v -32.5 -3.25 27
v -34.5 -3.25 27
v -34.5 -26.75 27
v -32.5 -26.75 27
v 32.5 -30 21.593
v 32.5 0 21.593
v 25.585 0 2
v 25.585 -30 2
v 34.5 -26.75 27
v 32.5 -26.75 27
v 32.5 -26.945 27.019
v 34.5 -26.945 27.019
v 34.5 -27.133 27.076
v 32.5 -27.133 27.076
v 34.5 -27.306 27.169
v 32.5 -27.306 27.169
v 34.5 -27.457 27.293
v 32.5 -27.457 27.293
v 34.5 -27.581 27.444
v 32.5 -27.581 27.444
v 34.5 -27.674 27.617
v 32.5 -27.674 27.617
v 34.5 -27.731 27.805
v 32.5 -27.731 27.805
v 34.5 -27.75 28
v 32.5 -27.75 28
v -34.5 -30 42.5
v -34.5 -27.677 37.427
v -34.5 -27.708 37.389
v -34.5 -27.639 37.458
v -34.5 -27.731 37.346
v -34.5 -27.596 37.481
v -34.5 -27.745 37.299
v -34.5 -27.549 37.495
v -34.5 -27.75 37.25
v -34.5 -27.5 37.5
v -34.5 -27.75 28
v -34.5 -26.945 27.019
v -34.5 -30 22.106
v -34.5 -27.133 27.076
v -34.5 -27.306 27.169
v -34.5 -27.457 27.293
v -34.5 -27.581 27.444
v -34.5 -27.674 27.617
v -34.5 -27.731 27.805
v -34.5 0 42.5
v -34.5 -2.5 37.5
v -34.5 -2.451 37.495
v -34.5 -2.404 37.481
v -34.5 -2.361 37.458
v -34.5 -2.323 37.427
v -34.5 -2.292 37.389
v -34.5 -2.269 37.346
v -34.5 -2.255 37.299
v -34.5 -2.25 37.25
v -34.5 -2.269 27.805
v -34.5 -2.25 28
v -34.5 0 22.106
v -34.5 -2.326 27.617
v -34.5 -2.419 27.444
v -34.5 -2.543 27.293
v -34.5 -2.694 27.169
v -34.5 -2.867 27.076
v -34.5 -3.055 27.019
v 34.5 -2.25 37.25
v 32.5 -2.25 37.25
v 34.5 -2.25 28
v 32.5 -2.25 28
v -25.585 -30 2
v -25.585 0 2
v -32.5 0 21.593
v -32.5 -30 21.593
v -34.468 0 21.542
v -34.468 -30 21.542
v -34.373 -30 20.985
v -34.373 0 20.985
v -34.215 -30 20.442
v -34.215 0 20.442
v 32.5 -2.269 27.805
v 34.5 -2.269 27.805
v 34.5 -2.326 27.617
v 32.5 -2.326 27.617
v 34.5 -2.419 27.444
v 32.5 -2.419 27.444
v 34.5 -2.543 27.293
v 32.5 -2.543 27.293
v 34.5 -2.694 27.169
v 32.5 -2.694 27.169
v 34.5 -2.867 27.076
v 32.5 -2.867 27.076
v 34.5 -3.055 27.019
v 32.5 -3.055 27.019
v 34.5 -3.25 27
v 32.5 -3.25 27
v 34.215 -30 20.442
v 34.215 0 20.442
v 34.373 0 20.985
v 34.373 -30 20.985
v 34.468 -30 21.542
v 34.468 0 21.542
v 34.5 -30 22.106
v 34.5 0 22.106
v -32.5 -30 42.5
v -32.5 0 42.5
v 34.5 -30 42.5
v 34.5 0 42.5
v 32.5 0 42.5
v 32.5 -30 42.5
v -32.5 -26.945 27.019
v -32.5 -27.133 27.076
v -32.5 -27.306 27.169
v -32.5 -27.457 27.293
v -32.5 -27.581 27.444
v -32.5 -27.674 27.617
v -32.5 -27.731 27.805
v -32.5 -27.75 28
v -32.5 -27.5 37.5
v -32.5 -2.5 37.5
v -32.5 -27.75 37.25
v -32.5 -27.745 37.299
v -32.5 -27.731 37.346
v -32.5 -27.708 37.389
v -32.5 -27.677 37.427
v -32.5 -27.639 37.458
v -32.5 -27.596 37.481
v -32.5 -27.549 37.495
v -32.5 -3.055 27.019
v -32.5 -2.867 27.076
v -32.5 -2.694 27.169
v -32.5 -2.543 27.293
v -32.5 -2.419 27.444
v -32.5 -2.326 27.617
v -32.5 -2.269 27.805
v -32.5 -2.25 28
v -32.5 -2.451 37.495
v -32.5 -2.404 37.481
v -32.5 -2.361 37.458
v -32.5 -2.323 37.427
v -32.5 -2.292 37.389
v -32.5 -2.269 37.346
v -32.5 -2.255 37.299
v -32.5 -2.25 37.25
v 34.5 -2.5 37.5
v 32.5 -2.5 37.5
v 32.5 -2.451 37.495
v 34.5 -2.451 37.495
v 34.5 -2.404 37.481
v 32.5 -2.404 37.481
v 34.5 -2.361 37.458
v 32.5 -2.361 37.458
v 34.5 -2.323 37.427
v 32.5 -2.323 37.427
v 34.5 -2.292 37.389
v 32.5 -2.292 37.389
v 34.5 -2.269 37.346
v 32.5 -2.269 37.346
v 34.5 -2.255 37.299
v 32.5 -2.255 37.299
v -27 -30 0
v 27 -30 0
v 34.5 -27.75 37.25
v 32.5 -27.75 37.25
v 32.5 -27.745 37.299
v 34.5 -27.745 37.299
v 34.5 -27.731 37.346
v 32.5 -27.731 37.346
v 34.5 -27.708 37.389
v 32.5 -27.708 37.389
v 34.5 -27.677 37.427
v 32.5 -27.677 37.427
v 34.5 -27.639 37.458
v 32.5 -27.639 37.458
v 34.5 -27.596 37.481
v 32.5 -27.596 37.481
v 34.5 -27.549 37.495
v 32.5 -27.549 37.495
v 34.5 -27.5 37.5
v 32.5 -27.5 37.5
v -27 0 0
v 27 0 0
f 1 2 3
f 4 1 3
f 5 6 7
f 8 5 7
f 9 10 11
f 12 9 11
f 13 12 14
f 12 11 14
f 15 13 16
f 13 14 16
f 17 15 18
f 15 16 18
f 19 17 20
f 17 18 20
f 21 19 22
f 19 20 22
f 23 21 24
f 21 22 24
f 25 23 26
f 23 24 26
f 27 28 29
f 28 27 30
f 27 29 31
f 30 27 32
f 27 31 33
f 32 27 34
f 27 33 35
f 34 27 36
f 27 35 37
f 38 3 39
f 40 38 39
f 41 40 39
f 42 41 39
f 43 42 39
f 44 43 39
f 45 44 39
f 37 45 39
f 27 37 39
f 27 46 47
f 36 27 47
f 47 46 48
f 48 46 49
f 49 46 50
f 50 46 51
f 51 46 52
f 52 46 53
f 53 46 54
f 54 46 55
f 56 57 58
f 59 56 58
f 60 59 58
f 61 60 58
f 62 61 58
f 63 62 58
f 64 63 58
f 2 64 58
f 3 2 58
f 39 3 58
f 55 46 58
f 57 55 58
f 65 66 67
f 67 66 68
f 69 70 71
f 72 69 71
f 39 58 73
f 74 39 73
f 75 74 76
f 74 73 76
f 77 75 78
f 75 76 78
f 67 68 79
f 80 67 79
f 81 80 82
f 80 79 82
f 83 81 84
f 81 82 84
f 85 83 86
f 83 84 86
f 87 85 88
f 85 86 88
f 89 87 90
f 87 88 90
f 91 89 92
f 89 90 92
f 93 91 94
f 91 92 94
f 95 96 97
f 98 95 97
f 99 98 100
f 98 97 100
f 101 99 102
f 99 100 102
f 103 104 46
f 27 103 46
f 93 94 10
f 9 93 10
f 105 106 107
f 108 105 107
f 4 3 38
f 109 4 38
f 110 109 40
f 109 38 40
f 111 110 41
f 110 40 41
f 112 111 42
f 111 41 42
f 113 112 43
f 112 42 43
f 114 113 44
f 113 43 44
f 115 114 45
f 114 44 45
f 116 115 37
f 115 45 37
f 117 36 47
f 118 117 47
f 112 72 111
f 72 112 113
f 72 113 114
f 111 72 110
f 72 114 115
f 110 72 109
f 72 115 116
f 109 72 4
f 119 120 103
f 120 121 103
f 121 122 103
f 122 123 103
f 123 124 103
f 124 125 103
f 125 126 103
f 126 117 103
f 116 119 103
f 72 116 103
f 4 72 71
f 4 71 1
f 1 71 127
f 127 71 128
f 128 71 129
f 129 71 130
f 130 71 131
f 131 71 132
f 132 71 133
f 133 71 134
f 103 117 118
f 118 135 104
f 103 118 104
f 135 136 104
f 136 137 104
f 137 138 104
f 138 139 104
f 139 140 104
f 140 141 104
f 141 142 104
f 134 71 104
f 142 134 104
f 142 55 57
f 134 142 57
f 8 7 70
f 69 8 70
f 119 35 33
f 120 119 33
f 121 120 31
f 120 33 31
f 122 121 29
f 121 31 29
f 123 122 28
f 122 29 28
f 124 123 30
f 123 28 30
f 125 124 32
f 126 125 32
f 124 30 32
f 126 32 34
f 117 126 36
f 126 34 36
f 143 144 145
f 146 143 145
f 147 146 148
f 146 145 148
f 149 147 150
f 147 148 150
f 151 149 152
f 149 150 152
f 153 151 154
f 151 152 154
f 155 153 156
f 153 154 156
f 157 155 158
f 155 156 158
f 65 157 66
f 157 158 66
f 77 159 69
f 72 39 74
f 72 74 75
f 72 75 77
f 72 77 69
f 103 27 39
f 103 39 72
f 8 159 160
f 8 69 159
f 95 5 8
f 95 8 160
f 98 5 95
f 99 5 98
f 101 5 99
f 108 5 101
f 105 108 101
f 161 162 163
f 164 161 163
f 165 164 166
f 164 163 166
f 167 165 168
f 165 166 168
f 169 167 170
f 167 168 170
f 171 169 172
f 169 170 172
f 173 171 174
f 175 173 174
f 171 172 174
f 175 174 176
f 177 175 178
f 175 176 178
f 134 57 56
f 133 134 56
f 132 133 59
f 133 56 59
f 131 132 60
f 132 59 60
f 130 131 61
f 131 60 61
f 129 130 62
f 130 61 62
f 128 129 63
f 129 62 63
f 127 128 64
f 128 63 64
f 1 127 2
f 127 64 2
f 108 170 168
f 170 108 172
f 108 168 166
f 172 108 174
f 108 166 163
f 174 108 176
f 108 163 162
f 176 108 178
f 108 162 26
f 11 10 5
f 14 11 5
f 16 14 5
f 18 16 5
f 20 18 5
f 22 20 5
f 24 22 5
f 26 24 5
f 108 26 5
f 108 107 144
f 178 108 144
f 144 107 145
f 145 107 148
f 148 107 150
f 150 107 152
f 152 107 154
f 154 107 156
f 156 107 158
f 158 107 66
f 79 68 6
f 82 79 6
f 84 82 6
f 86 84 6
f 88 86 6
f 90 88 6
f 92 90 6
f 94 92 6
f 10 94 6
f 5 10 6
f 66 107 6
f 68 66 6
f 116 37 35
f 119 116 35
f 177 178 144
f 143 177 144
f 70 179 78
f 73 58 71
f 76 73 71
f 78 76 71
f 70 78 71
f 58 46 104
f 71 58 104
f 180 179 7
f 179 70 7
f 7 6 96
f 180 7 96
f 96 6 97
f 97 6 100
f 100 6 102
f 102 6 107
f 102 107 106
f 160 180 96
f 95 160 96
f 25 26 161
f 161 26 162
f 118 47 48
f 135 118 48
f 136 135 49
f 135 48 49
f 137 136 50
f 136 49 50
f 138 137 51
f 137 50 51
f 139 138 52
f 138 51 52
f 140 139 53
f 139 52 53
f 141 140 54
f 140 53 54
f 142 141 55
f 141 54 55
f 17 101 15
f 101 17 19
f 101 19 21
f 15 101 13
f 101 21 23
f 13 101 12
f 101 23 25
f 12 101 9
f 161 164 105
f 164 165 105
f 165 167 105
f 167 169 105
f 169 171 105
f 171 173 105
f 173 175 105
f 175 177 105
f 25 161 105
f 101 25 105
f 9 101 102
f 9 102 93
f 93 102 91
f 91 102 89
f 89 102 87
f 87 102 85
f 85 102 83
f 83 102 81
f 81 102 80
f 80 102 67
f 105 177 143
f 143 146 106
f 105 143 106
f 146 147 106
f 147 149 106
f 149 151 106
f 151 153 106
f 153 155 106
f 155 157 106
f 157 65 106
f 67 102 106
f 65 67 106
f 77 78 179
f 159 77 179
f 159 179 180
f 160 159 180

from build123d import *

# Parameters (mm, degrees)
F1_DEPTH = 30
F3_DEPTH = 70


with BuildPart() as f1:
    # F0 (on Front) → F1 (new body)
    with BuildSketch(Plane.XZ):
        with BuildLine():
            Line((-27, 0), (0, 0))
            Line((0, 0), (27, 0))
            Line((27, 0), (34.214952, 20.442363))
            ThreePointArc((34.214952, 20.442363), (34.428223, 21.262295), (34.5, 22.106464))
            Line((34.5, 22.106464), (34.5, 42.5))
            Line((34.5, 42.5), (32.5, 42.5))
            Line((32.5, 42.5), (32.5, 21.592585))
            Line((32.5, 21.592585), (25.58497, 2))
            Line((25.58497, 2), (0, 2))
            Line((0, 2), (-25.58497, 2))
            Line((-25.58497, 2), (-32.5, 21.592585))
            Line((-32.5, 21.592585), (-32.5, 42.5))
            Line((-32.5, 42.5), (-34.5, 42.5))
            Line((-34.5, 42.5), (-34.5, 22.106464))
            ThreePointArc((-34.5, 22.106464), (-34.428223, 21.262295), (-34.214952, 20.442363))
            Line((-34.214952, 20.442363), (-27, 0))
        make_face()
    extrude(amount=F1_DEPTH)

    # F2 (on face) → F3 (cut)
    with BuildSketch(Plane(origin=(-34.5, 0, 0), x_dir=(0, -1, 0), z_dir=(-1, 0, 0))):
        with BuildLine():
            ThreePointArc((2.5, 37.5), (2.323223, 37.426777), (2.25, 37.25))
            Line((2.25, 37.25), (2.25, 28))
            ThreePointArc((2.25, 28), (2.542893, 27.292893), (3.25, 27))
            Line((3.25, 27), (26.75, 27))
            ThreePointArc((26.75, 27), (27.457107, 27.292893), (27.75, 28))
            Line((27.75, 28), (27.75, 37.25))
            ThreePointArc((27.75, 37.25), (27.676777, 37.426777), (27.5, 37.5))
            Line((27.5, 37.5), (2.5, 37.5))
        make_face()
    extrude(amount=-F3_DEPTH, mode=Mode.SUBTRACT)


solid = f1.part
